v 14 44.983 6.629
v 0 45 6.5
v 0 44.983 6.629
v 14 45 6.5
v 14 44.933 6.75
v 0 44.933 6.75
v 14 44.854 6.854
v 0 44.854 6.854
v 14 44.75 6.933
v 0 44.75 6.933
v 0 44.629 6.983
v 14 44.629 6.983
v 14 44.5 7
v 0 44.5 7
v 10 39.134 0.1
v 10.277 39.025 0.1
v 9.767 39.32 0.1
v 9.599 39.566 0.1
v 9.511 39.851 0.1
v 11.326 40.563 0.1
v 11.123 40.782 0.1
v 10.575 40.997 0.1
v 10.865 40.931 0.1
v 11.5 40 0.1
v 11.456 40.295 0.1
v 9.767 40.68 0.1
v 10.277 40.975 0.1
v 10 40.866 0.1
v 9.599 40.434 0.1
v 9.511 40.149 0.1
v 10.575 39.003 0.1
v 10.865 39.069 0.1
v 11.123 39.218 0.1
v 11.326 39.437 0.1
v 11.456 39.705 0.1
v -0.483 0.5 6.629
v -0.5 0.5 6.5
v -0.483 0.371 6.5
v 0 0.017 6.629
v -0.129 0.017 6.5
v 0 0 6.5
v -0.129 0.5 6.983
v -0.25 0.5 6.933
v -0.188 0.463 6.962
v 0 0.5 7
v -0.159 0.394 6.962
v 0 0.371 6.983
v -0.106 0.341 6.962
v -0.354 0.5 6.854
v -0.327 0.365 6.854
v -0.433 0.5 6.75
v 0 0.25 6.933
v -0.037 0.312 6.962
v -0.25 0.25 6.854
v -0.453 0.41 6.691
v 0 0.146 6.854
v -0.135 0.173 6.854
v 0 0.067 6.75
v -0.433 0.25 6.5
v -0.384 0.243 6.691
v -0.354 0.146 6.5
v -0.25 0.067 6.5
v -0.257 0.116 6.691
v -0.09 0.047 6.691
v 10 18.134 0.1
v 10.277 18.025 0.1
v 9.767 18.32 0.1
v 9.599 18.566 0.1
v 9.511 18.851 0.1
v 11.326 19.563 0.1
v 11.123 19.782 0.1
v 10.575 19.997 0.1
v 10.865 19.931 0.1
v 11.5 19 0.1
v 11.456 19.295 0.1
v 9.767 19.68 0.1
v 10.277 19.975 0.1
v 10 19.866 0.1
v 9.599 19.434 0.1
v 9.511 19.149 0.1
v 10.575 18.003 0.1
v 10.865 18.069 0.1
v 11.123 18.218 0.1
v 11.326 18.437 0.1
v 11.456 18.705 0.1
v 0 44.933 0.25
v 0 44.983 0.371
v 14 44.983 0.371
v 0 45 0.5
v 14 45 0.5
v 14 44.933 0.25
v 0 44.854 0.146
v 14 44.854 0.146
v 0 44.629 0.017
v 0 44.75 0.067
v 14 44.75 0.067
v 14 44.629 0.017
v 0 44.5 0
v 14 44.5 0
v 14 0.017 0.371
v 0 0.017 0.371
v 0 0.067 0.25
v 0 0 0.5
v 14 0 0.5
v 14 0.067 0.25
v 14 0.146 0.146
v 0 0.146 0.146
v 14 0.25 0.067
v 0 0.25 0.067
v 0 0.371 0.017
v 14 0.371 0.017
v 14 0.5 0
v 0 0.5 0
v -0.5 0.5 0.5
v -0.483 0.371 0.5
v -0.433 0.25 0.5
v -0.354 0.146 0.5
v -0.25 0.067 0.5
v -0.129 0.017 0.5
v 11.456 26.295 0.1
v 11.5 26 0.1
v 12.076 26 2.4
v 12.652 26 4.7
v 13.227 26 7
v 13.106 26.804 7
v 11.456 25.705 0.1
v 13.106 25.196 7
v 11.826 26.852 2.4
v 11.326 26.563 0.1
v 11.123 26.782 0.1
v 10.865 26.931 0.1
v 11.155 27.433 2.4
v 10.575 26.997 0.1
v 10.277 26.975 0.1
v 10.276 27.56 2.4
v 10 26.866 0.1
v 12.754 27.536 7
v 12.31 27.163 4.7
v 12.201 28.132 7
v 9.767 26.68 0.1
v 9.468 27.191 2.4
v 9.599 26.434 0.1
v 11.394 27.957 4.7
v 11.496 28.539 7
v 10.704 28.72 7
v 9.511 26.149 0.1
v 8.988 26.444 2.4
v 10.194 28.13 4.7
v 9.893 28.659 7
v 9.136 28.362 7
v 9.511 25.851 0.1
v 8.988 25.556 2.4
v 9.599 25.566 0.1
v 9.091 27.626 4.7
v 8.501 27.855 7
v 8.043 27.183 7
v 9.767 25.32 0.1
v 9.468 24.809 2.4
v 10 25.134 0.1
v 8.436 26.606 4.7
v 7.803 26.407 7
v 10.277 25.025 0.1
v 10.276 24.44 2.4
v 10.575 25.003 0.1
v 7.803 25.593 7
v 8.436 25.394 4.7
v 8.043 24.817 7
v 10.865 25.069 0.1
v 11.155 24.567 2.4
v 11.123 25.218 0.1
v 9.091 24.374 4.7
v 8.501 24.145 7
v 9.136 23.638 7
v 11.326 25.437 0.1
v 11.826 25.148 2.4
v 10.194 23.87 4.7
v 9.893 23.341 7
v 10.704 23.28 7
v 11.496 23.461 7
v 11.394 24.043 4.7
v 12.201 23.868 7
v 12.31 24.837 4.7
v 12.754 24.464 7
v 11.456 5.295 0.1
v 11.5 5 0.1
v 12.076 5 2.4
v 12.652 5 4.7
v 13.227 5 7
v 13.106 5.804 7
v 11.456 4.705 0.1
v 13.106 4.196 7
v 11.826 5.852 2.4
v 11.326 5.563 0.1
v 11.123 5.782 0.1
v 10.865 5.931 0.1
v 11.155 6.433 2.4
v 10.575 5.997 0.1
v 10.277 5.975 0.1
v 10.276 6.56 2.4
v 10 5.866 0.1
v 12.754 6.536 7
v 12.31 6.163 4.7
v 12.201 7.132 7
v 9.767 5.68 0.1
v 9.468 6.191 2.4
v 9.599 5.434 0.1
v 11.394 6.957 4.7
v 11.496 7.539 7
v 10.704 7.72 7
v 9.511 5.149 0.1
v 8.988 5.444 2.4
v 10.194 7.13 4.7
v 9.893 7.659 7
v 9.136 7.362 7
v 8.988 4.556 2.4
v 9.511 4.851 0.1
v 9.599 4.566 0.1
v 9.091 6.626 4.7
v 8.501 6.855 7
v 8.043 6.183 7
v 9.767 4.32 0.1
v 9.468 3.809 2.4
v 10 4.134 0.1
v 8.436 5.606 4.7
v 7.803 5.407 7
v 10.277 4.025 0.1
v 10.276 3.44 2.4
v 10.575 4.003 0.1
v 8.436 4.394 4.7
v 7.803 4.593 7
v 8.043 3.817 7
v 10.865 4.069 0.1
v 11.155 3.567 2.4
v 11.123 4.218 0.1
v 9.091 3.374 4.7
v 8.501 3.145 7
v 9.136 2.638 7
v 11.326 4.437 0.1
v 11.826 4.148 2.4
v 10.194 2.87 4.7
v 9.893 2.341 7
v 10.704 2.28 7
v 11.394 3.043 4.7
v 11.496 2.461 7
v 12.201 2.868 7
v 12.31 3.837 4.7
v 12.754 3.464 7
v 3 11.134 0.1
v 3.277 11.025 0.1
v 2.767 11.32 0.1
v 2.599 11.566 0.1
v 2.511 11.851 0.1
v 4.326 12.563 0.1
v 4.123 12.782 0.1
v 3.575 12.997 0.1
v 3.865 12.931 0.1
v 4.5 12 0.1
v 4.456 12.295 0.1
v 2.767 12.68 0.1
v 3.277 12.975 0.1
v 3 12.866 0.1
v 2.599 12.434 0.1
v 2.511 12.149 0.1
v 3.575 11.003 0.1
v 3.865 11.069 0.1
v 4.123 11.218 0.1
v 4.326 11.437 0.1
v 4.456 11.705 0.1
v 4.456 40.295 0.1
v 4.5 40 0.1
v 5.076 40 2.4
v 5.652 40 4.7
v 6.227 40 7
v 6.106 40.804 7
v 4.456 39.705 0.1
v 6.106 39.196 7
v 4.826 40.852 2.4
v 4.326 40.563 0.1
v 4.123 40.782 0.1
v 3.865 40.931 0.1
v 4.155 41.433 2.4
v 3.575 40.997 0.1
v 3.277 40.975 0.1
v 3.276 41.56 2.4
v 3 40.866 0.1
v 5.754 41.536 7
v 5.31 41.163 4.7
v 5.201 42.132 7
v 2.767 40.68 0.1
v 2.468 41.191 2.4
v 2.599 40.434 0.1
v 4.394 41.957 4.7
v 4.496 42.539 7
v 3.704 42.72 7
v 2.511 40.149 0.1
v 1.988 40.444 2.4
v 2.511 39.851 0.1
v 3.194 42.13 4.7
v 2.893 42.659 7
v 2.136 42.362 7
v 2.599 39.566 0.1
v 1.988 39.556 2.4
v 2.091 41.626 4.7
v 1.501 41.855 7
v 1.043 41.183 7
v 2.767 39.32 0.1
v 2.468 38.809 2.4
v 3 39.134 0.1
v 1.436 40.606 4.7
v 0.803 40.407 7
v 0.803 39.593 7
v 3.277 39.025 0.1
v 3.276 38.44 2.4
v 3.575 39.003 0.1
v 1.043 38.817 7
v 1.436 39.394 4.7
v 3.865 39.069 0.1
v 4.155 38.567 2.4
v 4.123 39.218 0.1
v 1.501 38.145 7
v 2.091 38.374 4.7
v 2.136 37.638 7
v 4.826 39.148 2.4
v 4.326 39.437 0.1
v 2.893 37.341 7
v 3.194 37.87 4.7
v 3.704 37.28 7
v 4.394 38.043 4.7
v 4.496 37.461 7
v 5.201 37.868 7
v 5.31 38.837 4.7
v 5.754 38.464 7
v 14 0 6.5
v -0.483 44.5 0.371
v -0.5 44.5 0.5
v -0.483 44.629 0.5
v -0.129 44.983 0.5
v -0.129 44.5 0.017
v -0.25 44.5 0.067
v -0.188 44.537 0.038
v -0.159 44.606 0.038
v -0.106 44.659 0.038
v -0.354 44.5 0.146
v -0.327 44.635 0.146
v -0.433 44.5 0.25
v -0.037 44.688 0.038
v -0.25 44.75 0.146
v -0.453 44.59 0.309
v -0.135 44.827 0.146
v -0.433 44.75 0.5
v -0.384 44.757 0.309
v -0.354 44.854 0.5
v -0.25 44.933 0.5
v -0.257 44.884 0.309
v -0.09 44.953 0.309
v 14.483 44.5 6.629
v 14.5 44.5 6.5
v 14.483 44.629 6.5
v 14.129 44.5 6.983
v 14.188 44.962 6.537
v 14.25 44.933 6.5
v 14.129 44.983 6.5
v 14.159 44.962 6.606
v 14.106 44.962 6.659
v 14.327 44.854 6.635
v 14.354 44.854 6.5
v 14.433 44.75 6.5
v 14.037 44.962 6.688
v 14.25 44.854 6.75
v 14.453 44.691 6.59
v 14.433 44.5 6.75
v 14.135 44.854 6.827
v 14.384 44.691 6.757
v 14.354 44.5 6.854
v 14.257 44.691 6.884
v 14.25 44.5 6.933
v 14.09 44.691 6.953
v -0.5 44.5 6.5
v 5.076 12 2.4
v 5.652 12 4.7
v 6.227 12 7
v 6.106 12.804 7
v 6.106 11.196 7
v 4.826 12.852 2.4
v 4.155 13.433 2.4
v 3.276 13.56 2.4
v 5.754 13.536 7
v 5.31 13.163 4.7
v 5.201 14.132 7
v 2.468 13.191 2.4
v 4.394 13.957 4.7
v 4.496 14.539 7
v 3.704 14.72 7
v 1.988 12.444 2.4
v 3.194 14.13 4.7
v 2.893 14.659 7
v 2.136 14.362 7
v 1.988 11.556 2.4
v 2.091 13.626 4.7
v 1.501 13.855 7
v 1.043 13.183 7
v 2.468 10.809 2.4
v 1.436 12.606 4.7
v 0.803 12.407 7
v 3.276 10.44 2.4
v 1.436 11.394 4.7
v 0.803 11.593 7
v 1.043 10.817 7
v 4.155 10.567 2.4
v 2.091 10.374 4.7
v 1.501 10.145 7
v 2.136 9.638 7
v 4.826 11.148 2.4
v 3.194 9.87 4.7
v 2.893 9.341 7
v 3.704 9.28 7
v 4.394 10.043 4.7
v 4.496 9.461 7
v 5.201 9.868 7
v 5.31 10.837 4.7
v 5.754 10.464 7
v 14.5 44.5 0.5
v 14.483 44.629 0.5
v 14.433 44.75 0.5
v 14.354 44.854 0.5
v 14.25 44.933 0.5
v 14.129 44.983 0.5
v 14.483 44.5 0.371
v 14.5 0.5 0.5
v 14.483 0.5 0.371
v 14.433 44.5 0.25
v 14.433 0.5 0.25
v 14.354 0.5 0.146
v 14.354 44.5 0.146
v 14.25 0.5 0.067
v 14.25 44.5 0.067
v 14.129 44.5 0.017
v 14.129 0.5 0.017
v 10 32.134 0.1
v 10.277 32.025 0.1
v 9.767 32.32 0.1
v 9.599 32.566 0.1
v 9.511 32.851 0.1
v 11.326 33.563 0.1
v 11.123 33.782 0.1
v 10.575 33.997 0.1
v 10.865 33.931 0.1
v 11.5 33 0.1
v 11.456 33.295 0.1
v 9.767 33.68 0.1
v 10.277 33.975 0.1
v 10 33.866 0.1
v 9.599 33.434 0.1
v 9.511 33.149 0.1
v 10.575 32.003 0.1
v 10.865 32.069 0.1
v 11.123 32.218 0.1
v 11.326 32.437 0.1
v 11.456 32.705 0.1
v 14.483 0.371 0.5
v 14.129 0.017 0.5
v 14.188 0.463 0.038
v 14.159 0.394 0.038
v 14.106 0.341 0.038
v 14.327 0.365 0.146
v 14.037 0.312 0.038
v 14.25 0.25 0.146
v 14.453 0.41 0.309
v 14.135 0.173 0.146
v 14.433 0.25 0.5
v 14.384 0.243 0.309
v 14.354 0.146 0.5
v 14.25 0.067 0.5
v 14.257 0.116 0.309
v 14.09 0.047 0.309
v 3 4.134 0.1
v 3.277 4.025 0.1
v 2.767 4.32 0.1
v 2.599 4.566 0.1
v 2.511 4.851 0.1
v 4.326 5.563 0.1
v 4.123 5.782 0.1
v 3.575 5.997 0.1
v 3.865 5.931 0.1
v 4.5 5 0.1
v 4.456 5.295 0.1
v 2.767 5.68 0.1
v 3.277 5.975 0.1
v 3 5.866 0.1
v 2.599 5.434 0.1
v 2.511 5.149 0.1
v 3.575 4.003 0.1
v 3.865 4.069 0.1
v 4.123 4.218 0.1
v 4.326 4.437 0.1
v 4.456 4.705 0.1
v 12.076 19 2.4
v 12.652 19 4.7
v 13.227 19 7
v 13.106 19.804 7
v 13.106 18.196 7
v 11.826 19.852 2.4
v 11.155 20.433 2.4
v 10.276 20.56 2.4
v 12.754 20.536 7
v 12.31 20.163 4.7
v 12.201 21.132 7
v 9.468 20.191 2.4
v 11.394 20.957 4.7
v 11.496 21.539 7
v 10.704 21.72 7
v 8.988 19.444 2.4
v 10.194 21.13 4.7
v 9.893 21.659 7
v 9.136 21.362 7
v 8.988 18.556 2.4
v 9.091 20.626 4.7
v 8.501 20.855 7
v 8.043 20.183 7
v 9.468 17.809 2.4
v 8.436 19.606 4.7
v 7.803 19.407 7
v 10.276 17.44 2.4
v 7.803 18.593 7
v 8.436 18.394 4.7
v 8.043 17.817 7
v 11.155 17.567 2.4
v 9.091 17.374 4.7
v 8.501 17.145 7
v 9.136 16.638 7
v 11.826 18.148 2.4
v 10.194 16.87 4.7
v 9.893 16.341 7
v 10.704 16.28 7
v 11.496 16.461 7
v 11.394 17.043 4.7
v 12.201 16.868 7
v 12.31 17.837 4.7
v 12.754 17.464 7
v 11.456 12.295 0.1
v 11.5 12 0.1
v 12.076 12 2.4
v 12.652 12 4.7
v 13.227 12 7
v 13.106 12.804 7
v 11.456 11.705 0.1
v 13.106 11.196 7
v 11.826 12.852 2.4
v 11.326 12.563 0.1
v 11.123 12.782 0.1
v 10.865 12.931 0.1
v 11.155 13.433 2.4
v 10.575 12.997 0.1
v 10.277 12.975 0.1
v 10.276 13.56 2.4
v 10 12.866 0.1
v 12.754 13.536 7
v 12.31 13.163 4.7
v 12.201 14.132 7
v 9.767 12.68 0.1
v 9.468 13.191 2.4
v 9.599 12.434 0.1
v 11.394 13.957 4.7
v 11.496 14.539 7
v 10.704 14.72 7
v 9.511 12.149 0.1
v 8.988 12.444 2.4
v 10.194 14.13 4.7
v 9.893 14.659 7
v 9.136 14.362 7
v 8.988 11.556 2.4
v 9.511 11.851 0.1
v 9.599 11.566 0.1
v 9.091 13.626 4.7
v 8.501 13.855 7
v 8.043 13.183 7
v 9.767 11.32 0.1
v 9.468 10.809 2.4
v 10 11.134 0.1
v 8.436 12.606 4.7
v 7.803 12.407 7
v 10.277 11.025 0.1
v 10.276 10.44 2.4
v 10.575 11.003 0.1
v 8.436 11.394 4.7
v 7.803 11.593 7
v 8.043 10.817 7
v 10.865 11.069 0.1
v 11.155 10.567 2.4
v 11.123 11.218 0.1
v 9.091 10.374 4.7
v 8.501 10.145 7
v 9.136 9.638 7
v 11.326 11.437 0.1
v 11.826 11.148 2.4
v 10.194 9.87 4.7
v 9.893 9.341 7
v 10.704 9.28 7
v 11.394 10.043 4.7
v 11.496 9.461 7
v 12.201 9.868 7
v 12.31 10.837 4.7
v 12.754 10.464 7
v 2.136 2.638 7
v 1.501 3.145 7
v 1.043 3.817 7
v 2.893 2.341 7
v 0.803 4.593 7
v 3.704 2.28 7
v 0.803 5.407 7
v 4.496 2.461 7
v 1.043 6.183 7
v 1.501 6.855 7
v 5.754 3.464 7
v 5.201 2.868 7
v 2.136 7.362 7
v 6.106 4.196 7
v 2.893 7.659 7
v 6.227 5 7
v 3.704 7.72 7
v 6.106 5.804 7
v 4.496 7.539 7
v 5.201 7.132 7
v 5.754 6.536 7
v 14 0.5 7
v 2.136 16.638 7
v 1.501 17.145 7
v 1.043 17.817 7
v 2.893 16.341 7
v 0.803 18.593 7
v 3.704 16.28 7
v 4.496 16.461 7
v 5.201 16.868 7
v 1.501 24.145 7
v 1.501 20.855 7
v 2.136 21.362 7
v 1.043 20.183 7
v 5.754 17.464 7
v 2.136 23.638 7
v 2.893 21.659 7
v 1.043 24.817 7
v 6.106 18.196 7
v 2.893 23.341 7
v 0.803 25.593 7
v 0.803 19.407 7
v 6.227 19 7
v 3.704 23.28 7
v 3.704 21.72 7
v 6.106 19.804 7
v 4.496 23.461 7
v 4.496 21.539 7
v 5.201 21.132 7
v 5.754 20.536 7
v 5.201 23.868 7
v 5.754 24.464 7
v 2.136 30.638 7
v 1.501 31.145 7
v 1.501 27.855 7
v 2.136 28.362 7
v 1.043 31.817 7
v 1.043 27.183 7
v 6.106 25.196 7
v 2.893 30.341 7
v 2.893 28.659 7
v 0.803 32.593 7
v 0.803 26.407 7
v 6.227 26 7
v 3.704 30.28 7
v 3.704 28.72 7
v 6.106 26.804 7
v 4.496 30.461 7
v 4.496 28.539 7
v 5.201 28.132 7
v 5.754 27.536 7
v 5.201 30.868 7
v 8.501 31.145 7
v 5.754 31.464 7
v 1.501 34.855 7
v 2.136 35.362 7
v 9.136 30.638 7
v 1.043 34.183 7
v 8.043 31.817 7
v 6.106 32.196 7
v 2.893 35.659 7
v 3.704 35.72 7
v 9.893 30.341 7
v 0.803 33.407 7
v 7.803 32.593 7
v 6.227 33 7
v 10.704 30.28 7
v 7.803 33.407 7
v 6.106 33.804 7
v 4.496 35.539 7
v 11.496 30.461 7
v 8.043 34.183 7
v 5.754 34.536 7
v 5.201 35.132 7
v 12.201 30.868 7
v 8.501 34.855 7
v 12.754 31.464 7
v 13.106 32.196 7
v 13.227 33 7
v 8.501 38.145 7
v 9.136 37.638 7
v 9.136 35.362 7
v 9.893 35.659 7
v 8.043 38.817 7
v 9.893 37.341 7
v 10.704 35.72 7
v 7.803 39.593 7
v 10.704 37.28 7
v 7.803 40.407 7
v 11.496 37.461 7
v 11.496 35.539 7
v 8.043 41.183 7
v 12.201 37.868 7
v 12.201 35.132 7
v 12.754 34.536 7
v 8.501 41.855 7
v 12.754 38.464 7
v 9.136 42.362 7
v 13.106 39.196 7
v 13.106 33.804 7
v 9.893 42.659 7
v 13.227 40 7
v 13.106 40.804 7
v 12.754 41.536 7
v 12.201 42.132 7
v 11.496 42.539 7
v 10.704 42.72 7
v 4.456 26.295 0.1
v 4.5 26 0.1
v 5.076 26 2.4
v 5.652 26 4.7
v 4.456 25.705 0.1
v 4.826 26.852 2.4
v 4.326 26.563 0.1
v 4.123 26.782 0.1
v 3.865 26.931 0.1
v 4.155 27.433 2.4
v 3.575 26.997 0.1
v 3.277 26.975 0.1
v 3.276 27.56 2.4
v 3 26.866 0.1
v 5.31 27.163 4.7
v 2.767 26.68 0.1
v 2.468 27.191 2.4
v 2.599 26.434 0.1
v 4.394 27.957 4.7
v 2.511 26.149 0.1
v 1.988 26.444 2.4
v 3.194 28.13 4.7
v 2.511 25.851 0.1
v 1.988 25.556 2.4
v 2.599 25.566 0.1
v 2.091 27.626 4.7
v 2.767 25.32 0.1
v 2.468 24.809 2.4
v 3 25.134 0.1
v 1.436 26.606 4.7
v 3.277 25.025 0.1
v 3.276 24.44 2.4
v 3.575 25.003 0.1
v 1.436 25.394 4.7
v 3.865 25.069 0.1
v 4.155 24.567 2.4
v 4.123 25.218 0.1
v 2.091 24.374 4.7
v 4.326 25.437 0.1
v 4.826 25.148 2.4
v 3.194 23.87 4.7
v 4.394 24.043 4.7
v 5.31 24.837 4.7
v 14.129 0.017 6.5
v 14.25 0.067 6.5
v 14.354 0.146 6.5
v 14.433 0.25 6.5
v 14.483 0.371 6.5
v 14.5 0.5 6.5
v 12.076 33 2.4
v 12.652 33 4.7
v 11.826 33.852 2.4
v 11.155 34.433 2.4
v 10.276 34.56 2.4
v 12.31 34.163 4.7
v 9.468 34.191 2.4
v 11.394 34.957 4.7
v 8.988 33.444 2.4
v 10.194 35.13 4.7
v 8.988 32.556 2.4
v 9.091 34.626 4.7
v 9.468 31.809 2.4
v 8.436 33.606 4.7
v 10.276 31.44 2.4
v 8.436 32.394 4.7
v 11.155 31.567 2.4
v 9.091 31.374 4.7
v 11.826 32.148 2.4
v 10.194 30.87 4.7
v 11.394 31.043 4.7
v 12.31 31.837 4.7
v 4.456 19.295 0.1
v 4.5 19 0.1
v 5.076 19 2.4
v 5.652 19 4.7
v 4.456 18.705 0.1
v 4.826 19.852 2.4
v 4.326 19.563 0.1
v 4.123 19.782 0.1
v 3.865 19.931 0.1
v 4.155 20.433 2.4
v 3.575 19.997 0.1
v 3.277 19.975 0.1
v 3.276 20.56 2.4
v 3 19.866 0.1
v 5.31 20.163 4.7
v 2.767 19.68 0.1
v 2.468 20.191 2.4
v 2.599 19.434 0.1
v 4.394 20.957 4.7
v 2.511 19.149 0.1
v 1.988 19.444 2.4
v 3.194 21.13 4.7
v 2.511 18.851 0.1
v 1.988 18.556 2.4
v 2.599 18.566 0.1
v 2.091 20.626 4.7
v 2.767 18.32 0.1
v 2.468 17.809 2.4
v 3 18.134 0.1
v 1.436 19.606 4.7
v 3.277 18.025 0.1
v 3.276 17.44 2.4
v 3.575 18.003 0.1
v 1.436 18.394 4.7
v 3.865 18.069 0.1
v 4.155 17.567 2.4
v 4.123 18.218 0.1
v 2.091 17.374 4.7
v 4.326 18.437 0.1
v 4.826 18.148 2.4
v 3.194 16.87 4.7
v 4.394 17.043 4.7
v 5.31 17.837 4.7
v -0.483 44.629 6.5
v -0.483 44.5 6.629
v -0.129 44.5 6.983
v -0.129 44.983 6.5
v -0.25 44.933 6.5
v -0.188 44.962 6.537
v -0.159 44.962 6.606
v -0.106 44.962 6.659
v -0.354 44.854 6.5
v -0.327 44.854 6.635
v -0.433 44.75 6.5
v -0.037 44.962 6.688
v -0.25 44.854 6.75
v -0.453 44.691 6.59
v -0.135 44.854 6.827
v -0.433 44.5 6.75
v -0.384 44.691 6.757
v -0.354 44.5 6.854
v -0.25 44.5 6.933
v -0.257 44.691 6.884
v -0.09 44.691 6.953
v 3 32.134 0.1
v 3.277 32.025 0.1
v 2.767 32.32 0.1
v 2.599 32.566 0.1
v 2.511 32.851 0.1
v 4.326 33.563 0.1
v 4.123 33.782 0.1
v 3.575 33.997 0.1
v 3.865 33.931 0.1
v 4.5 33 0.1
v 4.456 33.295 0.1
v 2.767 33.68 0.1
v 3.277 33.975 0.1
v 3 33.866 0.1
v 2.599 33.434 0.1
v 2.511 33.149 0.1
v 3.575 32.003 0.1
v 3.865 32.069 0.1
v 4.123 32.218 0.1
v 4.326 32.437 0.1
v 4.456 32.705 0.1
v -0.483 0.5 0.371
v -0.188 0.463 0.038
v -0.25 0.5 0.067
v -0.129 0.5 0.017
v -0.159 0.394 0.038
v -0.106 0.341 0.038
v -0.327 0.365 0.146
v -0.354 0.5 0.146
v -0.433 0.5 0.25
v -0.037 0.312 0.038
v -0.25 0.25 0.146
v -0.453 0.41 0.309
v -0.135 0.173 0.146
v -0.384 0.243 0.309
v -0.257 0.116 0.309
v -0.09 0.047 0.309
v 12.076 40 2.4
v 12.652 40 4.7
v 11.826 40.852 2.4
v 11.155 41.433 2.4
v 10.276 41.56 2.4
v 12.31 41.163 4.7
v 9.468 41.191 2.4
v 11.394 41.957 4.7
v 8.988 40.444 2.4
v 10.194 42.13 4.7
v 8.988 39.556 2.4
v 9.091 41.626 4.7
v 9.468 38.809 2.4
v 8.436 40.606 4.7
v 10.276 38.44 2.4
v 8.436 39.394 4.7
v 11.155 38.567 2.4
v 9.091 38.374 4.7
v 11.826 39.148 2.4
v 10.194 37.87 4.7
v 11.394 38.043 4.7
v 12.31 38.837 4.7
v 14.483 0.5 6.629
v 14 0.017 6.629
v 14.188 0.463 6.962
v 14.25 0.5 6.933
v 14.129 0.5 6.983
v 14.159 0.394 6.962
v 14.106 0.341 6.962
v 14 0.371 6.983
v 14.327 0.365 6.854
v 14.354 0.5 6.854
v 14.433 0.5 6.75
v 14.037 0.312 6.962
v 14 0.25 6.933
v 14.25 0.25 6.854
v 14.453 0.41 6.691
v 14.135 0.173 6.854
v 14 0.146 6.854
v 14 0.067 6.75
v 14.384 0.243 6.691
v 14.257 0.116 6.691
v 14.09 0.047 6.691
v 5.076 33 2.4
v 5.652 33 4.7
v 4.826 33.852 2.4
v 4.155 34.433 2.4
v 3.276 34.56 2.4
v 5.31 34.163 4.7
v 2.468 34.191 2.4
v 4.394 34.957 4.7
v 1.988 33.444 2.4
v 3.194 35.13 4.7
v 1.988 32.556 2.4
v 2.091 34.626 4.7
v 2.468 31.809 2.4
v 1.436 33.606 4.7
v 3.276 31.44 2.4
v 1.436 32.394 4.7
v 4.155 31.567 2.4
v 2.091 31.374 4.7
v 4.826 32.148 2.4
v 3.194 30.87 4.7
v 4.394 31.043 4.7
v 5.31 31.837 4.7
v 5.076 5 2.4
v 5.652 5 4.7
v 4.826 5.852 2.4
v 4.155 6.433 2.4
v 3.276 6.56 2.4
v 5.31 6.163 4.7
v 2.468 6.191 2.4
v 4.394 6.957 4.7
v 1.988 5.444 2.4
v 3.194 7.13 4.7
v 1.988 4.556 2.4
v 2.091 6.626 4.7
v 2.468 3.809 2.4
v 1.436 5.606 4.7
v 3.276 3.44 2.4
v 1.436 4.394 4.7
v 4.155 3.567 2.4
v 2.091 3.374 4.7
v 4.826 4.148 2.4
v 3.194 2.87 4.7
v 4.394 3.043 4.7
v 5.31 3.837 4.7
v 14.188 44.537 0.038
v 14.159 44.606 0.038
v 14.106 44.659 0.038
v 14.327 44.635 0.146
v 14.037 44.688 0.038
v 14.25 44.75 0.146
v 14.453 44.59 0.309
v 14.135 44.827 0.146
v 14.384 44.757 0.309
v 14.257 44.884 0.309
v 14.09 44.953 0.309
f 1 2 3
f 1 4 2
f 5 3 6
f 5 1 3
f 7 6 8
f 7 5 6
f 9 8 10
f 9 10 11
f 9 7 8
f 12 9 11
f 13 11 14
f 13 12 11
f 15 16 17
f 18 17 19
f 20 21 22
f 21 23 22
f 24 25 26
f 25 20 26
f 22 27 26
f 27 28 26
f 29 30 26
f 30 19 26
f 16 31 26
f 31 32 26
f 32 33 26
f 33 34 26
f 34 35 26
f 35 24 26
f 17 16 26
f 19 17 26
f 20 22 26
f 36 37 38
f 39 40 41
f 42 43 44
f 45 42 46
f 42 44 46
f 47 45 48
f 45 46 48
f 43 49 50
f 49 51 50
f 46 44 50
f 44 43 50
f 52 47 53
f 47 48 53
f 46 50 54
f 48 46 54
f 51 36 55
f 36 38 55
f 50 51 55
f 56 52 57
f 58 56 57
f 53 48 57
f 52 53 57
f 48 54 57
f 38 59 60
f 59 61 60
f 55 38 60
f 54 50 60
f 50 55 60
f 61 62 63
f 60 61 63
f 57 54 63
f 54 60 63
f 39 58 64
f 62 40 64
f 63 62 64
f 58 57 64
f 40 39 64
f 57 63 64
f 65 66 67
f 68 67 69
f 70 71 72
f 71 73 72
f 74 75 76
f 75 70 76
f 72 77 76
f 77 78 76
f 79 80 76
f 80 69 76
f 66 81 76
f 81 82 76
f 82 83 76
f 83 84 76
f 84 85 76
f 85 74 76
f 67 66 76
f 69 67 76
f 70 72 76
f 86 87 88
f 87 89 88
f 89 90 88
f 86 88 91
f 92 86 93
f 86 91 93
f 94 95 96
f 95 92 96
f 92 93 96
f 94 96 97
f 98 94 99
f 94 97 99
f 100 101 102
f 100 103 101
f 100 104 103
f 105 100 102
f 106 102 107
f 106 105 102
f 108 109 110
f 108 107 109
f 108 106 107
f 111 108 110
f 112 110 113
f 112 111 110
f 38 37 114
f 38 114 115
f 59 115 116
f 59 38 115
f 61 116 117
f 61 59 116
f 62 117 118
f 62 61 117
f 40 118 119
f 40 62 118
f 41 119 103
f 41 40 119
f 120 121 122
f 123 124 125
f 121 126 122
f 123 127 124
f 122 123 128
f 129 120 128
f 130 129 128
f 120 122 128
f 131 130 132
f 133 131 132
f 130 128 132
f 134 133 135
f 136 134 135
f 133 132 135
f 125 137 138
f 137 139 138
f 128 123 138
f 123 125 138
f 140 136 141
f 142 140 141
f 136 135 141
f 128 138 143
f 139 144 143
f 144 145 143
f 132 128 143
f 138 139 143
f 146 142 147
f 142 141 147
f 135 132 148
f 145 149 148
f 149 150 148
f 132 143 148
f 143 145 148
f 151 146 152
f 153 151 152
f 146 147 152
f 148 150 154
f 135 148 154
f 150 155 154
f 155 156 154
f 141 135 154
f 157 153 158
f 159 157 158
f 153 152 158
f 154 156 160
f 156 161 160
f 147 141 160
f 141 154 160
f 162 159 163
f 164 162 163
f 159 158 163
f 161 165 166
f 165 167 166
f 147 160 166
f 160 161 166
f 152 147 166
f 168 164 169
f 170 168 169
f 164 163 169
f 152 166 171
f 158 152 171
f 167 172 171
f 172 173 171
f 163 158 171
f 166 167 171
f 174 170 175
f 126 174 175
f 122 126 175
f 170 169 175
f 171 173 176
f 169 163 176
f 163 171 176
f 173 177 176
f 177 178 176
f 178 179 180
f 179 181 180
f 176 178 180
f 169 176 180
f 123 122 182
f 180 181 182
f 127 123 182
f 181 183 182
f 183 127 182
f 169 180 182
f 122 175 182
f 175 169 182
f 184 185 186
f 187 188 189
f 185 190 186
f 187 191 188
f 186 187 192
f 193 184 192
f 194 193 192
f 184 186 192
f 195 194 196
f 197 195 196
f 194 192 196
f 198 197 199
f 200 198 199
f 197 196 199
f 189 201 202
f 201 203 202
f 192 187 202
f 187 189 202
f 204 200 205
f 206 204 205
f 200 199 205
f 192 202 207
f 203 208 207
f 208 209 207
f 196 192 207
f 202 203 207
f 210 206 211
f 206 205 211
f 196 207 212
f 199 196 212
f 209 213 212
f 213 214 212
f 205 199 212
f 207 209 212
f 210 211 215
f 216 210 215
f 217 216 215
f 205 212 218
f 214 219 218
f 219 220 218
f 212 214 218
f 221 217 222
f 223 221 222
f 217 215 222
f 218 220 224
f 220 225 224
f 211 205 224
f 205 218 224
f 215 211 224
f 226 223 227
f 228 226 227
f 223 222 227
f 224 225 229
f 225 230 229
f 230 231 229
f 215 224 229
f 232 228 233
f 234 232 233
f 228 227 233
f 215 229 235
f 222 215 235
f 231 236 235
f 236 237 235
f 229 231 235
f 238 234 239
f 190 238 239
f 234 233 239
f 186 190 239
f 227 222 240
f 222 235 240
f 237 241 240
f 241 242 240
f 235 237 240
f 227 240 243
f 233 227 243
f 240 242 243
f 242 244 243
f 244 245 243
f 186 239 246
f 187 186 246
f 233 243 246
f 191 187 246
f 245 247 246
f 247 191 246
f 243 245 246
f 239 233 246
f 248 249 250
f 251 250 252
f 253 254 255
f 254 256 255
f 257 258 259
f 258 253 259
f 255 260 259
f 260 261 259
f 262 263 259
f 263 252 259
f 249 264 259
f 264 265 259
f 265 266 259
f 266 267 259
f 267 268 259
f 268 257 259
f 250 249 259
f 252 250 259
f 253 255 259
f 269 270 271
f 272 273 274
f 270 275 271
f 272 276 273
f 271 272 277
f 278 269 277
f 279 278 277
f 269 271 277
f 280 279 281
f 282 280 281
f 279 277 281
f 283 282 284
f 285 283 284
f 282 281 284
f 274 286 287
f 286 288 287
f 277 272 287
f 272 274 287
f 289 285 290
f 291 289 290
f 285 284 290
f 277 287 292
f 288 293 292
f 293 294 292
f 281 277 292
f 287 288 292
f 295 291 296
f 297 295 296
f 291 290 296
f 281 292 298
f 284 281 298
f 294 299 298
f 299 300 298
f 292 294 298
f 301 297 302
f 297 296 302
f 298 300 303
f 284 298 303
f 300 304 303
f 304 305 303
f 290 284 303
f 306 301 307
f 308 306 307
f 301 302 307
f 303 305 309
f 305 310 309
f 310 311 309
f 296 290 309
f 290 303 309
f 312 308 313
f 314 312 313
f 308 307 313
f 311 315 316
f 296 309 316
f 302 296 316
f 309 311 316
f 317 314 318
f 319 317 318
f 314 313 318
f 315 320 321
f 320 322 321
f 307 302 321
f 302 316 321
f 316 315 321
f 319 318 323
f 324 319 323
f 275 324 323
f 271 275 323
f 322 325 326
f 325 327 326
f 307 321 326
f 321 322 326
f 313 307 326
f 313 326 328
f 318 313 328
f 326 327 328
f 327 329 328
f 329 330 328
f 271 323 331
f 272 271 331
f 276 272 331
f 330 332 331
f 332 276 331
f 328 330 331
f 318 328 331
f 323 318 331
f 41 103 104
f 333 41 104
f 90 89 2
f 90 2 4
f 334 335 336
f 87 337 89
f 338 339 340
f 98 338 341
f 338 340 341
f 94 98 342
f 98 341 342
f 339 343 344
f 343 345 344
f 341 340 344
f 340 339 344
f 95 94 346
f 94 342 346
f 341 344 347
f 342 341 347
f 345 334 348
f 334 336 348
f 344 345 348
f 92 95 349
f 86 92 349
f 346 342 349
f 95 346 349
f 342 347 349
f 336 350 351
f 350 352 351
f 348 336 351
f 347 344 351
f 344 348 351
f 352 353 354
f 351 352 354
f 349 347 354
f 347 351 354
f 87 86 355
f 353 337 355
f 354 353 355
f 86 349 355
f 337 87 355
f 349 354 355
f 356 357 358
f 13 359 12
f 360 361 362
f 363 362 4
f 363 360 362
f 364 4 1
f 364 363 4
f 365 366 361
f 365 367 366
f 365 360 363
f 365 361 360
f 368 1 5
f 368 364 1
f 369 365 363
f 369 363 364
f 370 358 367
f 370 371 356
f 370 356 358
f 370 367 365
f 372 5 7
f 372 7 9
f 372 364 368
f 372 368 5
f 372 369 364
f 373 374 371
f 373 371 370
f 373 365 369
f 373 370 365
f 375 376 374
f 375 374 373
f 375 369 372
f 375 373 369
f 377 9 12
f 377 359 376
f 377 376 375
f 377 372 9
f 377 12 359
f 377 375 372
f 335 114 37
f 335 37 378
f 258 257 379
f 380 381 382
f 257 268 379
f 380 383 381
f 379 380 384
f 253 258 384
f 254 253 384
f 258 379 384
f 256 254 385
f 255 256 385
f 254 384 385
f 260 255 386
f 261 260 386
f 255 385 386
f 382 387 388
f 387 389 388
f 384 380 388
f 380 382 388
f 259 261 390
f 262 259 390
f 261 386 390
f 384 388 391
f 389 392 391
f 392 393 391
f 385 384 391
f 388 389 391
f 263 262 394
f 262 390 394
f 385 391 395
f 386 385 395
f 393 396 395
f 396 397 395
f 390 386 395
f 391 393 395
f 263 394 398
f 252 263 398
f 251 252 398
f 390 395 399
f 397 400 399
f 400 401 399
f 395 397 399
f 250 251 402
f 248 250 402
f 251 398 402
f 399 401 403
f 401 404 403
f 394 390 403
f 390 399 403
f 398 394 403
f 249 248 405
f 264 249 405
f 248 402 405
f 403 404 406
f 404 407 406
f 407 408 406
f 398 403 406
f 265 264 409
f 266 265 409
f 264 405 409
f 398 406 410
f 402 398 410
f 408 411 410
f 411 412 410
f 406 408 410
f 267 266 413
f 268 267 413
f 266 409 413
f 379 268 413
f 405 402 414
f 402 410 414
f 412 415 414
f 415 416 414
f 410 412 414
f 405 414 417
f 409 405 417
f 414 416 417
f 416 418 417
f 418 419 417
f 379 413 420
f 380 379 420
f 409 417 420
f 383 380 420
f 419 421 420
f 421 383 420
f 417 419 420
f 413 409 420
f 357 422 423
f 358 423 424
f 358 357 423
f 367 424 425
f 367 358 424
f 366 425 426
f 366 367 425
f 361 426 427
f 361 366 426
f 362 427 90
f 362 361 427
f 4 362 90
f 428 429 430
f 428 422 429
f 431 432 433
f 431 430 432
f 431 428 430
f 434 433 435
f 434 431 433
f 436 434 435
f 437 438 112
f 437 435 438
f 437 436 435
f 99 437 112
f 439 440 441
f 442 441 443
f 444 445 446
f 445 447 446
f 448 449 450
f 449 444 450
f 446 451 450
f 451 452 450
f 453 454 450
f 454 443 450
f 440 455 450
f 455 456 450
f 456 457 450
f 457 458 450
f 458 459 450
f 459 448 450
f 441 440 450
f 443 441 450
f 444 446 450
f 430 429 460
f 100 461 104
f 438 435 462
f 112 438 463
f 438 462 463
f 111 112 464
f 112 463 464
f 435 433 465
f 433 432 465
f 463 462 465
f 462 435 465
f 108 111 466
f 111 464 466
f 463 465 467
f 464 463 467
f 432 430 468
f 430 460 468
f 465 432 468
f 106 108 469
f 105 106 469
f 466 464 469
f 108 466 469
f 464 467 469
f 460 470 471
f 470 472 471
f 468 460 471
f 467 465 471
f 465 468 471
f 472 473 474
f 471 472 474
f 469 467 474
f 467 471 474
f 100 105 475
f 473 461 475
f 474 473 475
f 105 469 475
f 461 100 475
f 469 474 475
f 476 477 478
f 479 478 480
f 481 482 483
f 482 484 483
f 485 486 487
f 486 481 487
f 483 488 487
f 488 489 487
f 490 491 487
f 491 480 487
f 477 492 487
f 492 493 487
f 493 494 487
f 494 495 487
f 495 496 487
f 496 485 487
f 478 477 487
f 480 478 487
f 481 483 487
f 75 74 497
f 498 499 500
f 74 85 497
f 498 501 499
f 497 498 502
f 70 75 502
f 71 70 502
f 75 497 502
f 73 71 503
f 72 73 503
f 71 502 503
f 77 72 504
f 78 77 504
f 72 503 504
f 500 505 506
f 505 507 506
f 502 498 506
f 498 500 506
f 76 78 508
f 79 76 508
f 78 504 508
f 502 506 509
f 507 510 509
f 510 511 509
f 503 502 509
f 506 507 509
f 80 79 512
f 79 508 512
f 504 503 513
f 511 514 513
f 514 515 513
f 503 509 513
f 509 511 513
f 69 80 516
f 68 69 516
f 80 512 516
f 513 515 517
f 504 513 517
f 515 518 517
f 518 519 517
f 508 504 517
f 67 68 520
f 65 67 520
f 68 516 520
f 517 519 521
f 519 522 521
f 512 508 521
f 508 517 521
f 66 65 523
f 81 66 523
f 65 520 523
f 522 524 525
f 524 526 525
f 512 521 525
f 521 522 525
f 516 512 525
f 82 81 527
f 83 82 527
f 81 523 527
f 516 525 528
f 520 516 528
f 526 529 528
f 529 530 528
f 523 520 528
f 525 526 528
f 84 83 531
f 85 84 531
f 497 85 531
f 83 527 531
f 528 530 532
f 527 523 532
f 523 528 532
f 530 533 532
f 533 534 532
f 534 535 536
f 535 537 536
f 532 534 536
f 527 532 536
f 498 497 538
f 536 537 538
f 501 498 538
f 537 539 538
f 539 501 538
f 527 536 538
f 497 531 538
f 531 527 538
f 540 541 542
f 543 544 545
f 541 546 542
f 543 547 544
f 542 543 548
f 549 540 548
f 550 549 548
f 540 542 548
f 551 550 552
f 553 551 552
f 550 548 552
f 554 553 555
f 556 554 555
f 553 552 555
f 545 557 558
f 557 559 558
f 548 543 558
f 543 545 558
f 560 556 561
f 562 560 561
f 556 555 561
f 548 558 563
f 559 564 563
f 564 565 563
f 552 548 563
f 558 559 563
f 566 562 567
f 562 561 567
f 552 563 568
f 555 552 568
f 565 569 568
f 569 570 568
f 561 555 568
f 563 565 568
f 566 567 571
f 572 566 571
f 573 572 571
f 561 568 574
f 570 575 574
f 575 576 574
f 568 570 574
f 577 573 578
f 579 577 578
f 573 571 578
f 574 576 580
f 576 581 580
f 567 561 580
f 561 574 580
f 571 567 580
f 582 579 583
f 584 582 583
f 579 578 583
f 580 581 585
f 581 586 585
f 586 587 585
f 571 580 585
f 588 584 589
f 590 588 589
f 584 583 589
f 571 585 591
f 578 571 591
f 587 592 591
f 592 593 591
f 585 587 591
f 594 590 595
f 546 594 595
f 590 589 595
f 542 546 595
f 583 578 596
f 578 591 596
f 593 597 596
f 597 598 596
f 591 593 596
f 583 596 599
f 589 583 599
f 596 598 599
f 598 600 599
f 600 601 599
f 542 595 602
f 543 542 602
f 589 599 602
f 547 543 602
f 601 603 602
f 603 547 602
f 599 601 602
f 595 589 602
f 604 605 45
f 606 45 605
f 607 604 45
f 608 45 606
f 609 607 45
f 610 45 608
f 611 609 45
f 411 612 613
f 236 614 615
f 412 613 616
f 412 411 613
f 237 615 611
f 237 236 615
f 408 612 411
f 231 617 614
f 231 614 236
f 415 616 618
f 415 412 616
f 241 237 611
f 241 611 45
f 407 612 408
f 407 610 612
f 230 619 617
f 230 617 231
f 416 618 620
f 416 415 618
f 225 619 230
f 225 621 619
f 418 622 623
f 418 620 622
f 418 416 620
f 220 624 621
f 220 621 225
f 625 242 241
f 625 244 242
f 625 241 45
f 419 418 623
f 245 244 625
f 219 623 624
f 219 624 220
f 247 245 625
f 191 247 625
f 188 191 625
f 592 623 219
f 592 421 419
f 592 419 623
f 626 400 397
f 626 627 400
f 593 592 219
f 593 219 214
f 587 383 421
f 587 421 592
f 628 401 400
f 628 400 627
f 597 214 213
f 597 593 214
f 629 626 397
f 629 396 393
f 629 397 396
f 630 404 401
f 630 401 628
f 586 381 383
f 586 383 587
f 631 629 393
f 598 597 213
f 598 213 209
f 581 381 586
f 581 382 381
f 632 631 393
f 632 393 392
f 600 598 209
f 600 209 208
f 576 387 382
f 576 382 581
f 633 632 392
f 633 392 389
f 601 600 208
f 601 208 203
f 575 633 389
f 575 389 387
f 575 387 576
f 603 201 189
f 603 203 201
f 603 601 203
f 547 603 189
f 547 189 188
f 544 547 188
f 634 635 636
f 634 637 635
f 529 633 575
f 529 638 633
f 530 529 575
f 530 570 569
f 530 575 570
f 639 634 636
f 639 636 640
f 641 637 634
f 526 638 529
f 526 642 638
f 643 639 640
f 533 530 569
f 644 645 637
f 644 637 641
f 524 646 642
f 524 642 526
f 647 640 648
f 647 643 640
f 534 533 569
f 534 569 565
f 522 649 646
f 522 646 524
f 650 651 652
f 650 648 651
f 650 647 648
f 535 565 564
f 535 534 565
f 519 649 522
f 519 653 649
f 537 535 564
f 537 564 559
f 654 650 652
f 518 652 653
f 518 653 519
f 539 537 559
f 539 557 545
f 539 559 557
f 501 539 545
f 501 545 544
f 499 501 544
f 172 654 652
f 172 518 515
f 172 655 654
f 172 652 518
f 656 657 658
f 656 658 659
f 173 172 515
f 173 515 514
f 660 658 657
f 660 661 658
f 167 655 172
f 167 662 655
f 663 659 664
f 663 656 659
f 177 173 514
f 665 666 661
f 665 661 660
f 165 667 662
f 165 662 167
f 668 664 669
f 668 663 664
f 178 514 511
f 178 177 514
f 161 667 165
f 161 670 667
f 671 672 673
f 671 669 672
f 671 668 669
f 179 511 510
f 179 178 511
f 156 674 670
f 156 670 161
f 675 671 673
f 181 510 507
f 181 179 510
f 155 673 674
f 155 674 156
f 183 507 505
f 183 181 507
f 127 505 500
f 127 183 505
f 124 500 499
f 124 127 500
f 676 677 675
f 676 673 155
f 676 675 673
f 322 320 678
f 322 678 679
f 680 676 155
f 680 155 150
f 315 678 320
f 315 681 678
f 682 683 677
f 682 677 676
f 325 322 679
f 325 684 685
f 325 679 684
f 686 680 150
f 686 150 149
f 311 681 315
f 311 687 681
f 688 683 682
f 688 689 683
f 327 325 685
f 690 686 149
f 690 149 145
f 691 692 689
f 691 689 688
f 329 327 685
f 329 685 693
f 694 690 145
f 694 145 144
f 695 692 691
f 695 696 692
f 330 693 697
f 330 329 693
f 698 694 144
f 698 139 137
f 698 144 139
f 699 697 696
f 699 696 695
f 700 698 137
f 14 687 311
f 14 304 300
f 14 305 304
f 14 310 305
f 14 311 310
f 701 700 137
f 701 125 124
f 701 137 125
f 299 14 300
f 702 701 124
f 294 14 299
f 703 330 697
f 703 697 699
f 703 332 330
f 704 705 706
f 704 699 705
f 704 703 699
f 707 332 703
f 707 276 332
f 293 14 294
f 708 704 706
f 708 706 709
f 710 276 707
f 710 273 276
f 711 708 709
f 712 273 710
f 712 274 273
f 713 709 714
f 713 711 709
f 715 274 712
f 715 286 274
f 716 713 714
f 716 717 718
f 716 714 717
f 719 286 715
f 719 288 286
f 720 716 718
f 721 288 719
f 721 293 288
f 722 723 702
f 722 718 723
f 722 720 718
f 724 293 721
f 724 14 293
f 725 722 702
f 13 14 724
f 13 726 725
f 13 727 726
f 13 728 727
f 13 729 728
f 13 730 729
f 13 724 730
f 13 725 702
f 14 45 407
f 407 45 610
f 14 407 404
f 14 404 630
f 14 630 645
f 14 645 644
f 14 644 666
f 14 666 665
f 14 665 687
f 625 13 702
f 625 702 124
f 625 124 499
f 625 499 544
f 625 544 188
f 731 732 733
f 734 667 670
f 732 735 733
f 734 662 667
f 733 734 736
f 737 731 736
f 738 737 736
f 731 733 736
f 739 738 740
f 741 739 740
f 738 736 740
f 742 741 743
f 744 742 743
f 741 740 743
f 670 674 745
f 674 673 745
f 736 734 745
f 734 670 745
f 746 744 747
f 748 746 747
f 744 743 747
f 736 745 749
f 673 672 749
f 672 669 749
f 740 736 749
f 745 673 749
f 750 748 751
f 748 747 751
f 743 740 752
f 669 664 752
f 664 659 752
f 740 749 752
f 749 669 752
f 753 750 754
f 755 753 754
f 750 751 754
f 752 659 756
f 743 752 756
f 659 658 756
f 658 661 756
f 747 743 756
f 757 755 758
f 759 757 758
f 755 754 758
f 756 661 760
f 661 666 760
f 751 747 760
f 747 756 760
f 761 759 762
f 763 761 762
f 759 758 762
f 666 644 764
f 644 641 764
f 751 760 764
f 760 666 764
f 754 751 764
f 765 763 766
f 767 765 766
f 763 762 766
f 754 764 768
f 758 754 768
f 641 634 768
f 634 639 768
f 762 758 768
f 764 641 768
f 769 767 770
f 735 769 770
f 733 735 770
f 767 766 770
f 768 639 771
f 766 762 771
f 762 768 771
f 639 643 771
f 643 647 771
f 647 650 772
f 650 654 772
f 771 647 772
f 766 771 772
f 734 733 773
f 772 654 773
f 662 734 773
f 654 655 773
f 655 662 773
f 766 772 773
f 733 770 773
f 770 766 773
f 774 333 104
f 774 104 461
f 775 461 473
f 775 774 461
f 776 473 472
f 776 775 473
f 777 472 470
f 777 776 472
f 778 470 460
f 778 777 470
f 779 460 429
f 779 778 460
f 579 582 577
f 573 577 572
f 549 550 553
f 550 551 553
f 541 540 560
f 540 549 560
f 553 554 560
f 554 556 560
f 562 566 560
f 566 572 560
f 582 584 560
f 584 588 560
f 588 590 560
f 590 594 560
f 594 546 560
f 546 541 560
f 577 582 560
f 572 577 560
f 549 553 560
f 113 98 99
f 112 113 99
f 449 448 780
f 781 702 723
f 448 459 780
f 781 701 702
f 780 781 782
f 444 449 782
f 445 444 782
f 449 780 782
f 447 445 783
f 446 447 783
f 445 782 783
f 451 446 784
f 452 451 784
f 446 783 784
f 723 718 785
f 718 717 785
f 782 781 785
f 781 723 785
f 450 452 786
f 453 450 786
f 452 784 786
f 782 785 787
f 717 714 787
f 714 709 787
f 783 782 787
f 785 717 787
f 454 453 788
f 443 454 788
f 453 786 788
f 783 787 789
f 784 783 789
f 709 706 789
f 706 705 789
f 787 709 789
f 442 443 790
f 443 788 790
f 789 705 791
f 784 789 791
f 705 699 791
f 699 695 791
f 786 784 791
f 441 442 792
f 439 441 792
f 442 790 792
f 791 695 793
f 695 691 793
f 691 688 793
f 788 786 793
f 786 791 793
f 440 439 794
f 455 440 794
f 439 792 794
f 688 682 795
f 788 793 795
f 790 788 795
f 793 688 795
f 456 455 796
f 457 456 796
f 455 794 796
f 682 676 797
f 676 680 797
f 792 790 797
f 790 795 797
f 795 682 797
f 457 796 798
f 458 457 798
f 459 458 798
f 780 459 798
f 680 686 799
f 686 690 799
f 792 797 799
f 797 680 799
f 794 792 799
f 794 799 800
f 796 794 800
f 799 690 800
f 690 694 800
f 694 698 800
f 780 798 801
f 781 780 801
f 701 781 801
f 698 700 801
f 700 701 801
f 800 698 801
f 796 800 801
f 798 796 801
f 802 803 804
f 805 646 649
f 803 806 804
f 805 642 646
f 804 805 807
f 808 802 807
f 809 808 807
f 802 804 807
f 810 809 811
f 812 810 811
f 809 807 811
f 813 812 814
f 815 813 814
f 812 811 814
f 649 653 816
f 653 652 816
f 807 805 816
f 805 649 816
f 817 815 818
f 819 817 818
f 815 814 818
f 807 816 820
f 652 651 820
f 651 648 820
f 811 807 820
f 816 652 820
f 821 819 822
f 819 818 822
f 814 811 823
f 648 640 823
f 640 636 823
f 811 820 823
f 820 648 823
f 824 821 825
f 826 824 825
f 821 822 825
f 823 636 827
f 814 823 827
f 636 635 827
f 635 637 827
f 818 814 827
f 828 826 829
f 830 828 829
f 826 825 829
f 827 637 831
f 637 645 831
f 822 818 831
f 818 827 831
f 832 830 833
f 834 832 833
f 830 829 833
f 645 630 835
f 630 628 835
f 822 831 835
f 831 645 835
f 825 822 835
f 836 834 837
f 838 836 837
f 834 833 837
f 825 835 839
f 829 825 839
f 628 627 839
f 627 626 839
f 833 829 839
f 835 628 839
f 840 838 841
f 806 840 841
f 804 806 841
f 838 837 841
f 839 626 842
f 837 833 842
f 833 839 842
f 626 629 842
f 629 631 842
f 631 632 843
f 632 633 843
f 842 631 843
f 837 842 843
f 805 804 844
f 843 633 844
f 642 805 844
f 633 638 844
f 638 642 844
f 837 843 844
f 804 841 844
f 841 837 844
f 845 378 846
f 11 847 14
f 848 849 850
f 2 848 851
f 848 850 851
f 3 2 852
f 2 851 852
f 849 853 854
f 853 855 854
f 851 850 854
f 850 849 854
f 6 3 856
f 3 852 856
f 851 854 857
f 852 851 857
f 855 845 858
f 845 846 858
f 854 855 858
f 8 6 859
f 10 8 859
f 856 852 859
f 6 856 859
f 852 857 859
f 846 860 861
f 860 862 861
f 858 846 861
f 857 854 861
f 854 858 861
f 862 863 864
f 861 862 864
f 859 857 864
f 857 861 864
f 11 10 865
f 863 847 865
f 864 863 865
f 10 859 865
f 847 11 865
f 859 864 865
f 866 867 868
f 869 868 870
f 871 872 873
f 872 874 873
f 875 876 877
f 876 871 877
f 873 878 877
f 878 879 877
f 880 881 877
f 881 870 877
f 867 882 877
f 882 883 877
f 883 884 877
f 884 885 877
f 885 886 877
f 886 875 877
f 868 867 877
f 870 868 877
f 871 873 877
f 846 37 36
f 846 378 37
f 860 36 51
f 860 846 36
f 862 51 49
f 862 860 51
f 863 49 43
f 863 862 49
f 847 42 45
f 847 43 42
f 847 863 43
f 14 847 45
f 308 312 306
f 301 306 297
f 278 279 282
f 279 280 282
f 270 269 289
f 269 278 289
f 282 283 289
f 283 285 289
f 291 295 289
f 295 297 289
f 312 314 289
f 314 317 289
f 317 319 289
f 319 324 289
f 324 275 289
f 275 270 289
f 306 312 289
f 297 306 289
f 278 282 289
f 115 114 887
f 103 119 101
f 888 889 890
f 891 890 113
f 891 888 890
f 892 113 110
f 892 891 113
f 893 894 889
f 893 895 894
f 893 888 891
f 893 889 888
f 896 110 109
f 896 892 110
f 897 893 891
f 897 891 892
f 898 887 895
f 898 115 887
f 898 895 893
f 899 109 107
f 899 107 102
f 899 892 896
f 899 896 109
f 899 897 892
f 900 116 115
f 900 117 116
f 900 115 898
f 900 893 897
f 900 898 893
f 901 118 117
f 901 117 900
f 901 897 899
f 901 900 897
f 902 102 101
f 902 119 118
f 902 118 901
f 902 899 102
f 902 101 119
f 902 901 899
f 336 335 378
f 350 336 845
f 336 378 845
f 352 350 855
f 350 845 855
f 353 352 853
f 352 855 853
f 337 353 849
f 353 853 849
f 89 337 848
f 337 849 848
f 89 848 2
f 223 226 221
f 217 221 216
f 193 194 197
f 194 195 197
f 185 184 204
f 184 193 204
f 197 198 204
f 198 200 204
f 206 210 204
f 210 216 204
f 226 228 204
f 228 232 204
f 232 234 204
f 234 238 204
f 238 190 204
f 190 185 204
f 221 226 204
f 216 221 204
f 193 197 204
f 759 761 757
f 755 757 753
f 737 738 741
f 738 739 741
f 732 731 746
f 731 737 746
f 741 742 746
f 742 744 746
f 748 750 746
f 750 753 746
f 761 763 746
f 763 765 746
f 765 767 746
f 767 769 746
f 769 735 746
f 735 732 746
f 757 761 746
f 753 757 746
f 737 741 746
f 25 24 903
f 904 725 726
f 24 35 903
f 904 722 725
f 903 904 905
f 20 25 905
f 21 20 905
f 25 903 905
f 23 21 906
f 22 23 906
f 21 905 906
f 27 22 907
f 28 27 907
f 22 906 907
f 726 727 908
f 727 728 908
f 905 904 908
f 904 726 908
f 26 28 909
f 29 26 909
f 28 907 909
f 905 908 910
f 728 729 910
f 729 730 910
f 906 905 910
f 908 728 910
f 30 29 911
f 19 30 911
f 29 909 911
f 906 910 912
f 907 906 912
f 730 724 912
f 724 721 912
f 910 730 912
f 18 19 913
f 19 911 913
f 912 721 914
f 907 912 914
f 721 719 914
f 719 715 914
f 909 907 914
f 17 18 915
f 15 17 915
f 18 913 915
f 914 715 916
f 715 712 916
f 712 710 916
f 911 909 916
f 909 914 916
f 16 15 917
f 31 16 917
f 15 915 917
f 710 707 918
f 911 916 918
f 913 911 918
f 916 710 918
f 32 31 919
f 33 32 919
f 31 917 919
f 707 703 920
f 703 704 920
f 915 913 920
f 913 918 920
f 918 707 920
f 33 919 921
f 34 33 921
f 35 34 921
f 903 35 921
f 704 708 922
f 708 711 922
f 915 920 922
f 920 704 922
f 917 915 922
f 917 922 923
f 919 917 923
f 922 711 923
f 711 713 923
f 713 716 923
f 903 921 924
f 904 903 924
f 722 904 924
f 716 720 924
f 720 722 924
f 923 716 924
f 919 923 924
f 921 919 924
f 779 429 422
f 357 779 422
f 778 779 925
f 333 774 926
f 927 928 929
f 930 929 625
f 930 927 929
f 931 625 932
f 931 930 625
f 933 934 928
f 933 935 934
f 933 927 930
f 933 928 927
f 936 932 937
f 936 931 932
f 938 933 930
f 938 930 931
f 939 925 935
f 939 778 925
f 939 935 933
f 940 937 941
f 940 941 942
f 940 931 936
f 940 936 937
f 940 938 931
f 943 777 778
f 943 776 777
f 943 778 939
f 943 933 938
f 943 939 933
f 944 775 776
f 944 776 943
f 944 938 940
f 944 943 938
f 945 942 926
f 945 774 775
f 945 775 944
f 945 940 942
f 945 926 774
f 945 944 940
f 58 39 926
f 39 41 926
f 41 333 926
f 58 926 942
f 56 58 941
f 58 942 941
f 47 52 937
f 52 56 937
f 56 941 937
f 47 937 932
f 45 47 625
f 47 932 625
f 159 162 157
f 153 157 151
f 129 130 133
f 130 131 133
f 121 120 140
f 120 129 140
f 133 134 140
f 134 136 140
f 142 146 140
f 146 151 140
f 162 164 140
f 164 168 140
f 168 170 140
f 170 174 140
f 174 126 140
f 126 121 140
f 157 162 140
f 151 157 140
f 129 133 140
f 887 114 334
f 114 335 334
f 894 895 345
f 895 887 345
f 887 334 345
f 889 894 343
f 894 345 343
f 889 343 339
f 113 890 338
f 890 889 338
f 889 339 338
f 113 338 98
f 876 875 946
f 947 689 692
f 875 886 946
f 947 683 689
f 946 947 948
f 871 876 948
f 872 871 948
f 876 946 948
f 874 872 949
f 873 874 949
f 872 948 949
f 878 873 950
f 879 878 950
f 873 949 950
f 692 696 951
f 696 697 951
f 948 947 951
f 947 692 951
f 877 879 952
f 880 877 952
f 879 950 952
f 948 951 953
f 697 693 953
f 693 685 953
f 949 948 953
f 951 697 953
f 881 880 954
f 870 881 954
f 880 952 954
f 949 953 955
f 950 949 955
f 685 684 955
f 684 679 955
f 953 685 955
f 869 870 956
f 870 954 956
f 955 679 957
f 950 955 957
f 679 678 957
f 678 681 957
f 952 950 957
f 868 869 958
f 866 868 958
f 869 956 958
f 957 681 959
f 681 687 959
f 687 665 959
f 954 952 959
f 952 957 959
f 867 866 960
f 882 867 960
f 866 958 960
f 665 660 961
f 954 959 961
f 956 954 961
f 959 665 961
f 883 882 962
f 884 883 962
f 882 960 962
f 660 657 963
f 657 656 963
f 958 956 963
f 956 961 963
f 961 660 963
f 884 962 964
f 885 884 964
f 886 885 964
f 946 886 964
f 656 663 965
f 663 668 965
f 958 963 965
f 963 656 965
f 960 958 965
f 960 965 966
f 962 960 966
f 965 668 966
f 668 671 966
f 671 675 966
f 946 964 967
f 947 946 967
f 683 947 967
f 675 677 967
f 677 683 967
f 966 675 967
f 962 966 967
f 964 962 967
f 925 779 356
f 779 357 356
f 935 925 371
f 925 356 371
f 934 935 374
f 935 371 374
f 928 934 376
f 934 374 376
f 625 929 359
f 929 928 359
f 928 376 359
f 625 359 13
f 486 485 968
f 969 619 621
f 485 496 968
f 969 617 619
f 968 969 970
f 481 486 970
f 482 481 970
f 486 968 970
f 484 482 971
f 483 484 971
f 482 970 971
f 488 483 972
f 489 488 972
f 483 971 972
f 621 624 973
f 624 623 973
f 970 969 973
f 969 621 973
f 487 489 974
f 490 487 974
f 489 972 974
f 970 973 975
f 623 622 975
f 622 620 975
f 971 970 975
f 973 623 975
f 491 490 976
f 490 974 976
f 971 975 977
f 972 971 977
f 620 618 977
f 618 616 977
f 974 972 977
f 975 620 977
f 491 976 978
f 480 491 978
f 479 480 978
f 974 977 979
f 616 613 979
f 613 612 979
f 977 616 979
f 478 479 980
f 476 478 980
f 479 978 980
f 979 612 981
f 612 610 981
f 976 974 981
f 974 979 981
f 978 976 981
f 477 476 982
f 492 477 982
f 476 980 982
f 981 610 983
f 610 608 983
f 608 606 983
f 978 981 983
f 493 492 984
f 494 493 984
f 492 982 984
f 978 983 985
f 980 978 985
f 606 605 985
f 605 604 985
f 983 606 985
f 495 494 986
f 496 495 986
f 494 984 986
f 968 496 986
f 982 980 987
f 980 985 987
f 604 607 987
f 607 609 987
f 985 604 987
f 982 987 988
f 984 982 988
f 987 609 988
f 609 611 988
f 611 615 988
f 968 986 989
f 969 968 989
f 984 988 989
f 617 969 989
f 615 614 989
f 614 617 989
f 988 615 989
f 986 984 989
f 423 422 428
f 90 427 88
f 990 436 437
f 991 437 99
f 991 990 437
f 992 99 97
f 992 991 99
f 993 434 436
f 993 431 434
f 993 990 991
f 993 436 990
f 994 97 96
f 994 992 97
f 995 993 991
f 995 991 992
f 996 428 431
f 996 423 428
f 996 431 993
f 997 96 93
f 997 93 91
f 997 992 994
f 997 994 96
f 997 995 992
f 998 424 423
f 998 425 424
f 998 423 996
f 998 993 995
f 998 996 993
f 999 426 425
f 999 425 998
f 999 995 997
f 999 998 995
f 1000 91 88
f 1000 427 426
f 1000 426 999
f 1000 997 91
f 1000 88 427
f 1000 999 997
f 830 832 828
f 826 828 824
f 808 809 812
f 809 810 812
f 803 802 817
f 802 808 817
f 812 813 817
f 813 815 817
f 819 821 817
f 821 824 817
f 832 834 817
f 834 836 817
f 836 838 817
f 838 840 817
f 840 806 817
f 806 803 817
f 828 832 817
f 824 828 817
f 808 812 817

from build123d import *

# Parameters (mm, degrees)
ARRAY_X_COUNT = 2
ARRAY_X_PITCH = 7
ARRAY_Y_COUNT = 6
ARRAY_Y_PITCH = 7
BOX_W         = 15
BOX_H         = 45
BOX_DEPTH     = 7
FILLET_R      = 0.5


with BuildPart() as array:
    # Cone → Cone (revolve)
    with BuildSketch(Plane(origin=(3.5, 5, 0), x_dir=(1, 0, 0), z_dir=(0, -1, 0))):
        Polygon((0, 0), (1, 0), (2.75, 6.99), (0, 6.99), align=None)
    revolve(axis=Axis((3.5, 5, 0), (0, 0, 1)))

    # Array X: Array ×2


with BuildPart() as array_1:
    add(array.part)
    with Locations(*[(i * ARRAY_X_PITCH, 0, 0) for i in range(1, ARRAY_X_COUNT)]):
        add(array.part)

    # Array Y: Array ×6


with BuildPart() as array_2:
    add(array_1.part)
    with Locations(*[(0, i * ARRAY_Y_PITCH, 0) for i in range(1, ARRAY_Y_COUNT)]):
        add(array_1.part)


with BuildPart() as array_3:
    # Array placement: moved
    add(array_2.part.moved(Location((0, 0, 0.1))))


with BuildPart() as cut:
    # Box → Box (new body)
    with BuildSketch(Plane(origin=(-0.5, 0, 0), x_dir=(1, 0, 0), z_dir=(0, 0, 1))):
        with Locations((7.5, 22.5)):
            Rectangle(BOX_W, BOX_H)
    extrude(amount=BOX_DEPTH)

    # Fillet
    fillet_edges = [cut.edges().sort_by_distance(p)[0] for p in [
        (-0.5, 0, 3.5),
        (-0.5, 22.5, 7),
        (-0.5, 45, 3.5),
        (-0.5, 22.5, 0),
        (14.5, 0, 3.5),
        (14.5, 22.5, 7),
        (14.5, 45, 3.5),
        (14.5, 22.5, 0),
        (7, 0, 0),
        (7, 0, 7),
        (7, 45, 0),
        (7, 45, 7),
    ]]
    fillet(fillet_edges, radius=FILLET_R)

    # Cut: cut Array
    add(array_3.part, mode=Mode.SUBTRACT)


solid = cut.part
